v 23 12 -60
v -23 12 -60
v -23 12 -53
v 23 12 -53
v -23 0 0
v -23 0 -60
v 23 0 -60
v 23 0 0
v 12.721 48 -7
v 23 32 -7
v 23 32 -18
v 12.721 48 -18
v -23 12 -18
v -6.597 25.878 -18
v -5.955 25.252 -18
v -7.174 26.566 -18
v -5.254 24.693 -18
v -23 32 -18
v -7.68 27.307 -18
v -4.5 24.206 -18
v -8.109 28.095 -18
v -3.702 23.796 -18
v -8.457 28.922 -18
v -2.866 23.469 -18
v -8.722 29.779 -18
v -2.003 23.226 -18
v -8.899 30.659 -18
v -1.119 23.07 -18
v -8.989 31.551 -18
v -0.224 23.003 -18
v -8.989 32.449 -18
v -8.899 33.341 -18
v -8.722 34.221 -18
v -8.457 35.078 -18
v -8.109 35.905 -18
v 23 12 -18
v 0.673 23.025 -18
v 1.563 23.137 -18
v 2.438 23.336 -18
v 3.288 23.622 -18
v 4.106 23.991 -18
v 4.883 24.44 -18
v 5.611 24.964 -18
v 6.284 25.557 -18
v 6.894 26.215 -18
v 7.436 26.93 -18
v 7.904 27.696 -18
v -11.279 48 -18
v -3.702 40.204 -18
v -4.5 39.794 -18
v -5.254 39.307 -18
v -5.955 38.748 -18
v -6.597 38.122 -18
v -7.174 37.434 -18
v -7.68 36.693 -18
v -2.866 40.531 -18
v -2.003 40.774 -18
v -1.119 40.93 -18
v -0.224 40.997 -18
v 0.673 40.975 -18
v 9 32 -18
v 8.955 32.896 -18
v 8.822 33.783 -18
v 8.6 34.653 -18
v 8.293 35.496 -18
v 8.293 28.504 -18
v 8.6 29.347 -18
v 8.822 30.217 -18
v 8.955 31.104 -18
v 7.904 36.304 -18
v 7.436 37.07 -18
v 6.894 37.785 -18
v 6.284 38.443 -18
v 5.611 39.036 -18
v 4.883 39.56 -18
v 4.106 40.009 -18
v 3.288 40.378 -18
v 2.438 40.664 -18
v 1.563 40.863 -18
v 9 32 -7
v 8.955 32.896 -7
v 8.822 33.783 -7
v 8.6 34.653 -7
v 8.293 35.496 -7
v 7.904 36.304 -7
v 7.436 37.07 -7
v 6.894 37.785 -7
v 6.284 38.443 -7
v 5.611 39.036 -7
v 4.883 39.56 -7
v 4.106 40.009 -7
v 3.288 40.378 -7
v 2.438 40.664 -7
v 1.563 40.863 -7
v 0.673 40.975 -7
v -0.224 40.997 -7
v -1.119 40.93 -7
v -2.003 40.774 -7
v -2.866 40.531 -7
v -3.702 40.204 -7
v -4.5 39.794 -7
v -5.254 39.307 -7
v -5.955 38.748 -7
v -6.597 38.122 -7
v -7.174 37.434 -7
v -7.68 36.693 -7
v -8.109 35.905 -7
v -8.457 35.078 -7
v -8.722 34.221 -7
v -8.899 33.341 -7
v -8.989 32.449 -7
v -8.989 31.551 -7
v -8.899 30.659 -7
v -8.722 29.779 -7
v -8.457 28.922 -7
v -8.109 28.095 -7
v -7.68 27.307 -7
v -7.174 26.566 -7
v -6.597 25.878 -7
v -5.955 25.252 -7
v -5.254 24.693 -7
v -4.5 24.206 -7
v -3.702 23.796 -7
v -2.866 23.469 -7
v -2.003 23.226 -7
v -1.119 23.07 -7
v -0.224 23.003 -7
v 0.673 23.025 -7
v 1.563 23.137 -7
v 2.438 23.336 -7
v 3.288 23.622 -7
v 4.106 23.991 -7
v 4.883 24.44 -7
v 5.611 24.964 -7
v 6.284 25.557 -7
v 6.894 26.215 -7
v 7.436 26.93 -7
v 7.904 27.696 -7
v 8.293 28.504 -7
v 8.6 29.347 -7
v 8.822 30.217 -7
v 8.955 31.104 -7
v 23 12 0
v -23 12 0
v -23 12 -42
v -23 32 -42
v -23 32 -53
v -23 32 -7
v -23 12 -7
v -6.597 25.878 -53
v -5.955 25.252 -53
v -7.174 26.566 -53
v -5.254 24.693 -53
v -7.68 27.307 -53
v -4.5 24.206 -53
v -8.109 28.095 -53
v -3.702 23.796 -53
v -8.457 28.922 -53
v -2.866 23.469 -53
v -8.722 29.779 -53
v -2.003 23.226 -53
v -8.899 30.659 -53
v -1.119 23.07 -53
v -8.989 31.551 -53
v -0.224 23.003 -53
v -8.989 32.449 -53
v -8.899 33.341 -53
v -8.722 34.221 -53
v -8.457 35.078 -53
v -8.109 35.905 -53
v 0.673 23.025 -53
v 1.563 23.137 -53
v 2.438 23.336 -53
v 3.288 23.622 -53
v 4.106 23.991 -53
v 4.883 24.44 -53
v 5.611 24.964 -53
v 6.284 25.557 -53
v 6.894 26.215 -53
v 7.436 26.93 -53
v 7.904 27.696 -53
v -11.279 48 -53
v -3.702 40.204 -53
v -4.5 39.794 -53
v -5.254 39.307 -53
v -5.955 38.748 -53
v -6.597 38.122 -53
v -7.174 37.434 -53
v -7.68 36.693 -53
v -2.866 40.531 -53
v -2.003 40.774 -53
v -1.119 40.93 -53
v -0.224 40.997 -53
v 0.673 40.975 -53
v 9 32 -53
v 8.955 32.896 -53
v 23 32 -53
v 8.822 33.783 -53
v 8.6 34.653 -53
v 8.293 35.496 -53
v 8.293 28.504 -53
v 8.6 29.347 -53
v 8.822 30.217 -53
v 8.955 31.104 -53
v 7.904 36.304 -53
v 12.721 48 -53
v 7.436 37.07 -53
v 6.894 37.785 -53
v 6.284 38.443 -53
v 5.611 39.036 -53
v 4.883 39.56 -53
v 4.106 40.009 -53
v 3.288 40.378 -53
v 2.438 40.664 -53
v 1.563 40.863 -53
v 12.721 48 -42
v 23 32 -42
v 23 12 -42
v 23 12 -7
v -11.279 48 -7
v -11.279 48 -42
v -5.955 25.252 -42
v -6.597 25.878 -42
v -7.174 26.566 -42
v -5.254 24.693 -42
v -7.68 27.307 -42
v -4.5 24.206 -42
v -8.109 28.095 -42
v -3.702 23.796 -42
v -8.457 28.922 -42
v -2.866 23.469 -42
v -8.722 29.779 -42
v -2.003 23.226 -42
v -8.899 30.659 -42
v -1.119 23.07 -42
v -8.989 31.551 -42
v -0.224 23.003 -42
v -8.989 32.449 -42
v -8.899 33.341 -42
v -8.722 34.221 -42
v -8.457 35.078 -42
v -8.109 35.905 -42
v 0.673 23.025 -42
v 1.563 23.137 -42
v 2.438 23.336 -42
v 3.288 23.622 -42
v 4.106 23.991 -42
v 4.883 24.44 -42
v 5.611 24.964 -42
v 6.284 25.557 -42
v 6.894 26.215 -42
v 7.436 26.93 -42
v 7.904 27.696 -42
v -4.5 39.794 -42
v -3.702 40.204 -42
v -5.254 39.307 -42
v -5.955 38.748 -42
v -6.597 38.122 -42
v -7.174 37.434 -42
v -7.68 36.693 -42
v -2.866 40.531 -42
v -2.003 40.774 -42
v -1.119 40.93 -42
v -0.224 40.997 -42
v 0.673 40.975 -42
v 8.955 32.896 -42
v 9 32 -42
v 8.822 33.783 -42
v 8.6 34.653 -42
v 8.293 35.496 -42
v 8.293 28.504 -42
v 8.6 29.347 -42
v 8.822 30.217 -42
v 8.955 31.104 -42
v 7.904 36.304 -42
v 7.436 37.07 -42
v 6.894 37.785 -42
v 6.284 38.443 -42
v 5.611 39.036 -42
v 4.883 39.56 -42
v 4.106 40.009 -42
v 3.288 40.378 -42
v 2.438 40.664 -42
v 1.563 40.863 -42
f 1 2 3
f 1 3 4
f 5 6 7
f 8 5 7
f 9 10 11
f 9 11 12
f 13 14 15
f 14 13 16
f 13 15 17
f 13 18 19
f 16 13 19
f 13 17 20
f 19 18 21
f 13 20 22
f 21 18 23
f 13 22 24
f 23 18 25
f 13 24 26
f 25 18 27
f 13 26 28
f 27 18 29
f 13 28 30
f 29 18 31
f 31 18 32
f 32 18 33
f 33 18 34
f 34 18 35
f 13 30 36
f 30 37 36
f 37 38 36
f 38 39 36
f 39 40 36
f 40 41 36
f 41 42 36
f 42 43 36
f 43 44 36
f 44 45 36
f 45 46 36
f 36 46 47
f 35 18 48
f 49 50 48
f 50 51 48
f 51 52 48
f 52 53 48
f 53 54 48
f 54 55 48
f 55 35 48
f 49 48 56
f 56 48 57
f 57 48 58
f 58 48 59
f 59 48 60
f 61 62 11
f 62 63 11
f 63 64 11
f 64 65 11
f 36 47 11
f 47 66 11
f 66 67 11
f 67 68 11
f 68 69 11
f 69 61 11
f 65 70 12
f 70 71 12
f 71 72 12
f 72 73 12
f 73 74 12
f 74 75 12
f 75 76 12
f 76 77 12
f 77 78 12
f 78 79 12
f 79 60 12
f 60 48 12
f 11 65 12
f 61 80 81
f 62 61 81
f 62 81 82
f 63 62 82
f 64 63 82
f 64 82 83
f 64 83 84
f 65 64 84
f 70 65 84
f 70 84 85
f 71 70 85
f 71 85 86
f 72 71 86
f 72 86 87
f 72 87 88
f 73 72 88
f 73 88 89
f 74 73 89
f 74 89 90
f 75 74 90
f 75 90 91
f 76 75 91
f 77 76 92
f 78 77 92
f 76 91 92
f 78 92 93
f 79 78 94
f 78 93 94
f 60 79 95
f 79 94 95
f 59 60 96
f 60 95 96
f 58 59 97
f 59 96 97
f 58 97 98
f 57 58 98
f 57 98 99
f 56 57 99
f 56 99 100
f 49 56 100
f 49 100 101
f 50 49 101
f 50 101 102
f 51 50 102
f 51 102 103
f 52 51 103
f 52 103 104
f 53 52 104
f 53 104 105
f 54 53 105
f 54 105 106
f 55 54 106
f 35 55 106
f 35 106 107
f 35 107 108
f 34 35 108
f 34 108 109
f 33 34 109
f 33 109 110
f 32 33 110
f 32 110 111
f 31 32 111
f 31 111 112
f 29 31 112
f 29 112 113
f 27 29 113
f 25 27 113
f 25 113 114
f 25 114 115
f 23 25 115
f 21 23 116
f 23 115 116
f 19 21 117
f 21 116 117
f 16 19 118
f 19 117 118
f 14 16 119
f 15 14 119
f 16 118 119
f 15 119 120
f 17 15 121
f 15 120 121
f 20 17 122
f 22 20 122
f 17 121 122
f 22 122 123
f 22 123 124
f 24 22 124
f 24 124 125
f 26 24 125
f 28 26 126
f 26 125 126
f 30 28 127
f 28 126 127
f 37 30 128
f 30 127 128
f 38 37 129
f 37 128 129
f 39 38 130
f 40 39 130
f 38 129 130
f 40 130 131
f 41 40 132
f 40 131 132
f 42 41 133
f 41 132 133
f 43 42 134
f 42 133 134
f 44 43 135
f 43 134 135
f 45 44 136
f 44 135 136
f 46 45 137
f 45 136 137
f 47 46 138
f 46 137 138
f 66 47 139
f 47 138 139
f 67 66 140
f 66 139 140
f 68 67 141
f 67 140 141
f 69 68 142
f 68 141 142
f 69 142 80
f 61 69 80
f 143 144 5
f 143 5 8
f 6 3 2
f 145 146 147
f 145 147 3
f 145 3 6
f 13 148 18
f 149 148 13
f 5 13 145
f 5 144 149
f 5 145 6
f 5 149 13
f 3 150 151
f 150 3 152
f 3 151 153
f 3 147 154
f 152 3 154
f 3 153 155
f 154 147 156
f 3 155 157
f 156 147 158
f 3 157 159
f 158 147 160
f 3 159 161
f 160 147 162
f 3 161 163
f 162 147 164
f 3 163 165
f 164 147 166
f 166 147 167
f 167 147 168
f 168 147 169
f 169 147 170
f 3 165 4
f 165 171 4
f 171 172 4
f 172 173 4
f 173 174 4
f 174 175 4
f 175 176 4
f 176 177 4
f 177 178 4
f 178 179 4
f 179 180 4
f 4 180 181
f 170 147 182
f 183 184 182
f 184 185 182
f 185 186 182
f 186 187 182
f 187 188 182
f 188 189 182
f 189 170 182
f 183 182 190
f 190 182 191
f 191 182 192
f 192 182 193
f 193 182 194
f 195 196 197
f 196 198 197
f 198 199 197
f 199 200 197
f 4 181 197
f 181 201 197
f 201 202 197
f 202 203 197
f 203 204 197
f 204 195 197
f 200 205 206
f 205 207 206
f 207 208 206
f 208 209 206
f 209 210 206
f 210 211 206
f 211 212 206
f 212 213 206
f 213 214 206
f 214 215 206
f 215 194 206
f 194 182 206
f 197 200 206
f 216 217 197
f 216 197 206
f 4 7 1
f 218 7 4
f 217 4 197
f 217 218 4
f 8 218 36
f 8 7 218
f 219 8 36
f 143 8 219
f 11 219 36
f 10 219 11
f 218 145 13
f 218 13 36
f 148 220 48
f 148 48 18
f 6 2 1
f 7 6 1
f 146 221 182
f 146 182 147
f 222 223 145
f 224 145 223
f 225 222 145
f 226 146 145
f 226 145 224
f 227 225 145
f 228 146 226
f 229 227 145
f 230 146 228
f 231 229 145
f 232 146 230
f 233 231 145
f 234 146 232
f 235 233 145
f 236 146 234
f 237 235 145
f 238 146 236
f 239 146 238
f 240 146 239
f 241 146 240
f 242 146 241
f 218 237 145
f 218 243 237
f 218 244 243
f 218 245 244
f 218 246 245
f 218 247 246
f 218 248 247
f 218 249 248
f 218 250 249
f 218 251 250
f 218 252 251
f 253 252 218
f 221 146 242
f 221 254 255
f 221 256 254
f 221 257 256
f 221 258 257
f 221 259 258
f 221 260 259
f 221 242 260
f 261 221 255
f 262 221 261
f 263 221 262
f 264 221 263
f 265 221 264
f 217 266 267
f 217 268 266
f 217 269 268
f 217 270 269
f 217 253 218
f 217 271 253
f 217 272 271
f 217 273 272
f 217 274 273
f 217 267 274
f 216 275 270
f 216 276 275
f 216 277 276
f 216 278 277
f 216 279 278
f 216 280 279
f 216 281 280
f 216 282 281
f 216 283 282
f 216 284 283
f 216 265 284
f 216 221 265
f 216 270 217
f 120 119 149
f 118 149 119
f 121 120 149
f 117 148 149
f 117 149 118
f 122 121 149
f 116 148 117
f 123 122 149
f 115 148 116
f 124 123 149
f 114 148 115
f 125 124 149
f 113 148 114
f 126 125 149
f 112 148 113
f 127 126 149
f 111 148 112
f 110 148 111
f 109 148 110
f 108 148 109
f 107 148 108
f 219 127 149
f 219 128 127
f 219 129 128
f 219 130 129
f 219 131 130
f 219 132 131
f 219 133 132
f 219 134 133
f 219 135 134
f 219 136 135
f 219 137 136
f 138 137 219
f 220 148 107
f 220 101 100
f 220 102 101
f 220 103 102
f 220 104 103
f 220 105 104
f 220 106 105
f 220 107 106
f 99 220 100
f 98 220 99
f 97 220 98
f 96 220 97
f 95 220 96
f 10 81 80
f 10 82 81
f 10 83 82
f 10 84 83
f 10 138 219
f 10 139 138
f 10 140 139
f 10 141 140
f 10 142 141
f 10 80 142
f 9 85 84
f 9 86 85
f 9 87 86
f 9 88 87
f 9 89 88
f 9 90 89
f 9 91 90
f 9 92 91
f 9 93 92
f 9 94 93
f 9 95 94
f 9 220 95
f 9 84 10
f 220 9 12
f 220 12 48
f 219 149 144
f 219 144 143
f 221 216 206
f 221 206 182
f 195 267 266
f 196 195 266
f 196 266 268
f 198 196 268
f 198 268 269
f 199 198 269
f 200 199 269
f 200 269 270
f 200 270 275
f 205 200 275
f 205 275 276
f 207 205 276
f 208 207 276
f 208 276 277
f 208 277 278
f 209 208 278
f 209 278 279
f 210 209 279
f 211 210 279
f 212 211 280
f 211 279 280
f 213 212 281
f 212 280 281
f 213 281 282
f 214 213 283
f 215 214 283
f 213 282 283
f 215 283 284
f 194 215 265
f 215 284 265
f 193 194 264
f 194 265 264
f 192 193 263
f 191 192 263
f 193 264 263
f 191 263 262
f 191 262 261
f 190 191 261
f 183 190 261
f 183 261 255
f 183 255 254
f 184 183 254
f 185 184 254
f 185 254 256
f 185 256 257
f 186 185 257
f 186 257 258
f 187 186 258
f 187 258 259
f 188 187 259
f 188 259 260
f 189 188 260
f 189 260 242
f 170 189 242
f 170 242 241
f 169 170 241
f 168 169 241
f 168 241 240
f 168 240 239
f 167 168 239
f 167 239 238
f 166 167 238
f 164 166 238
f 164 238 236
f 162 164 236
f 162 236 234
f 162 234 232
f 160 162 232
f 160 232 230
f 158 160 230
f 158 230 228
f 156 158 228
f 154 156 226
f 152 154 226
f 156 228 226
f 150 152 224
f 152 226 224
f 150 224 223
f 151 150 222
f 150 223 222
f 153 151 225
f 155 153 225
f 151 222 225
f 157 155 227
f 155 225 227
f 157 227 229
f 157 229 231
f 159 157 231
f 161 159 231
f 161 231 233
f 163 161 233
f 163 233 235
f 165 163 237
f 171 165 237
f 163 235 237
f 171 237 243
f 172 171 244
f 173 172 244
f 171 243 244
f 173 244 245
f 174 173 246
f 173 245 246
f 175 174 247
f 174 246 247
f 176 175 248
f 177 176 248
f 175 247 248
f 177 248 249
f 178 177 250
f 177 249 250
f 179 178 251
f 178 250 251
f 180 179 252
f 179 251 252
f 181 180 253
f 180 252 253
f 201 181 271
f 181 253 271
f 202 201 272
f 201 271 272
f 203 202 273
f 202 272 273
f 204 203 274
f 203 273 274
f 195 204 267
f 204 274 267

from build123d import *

# Parameters (mm, degrees)
CROQUIS1_R              = 9
SALIENTE_EXTRUIR1_DEPTH = 60
CROQUIS3_W              = 46
CROQUIS3_H              = 7
CORTAR_EXTRUIR1_DEPTH   = 36
CROQUIS4_W              = 47.607342582
CROQUIS4_H              = 24
CORTAR_EXTRUIR5_DEPTH   = 36


with BuildPart() as part:
    # Croquis1 → Saliente-Extruir1 (new body)
    with BuildSketch(Plane.XY):
        Polygon((-23, 0), (23, 0), (23, 32), (12.720887074, 48), (-11.279112926, 48), (-23, 32), align=None)
        with Locations((0, 32)):
            Circle(CROQUIS1_R, mode=Mode.SUBTRACT)
    extrude(amount=-SALIENTE_EXTRUIR1_DEPTH)

    # Croquis3 → Cortar-Extruir1 (cut)
    with BuildSketch(Plane(origin=(0, 48, 0), x_dir=(1, 0, 0), z_dir=(0, 1, 0))):
        with Locations((0, 3.5)):
            Rectangle(CROQUIS3_W, CROQUIS3_H)
        with Locations((0, 56.5)):
            Rectangle(CROQUIS3_W, CROQUIS3_H)
    extrude(amount=-CORTAR_EXTRUIR1_DEPTH, mode=Mode.SUBTRACT)

    # Croquis4 → Cortar-Extruir5 (cut)
    with BuildSketch(Plane(origin=(0, 48, 0), x_dir=(1, 0, 0), z_dir=(0, 1, 0))):
        with Locations((0.803671291, 30)):
            Rectangle(CROQUIS4_W, CROQUIS4_H)
    extrude(amount=-CORTAR_EXTRUIR5_DEPTH, mode=Mode.SUBTRACT)


solid = part.part
